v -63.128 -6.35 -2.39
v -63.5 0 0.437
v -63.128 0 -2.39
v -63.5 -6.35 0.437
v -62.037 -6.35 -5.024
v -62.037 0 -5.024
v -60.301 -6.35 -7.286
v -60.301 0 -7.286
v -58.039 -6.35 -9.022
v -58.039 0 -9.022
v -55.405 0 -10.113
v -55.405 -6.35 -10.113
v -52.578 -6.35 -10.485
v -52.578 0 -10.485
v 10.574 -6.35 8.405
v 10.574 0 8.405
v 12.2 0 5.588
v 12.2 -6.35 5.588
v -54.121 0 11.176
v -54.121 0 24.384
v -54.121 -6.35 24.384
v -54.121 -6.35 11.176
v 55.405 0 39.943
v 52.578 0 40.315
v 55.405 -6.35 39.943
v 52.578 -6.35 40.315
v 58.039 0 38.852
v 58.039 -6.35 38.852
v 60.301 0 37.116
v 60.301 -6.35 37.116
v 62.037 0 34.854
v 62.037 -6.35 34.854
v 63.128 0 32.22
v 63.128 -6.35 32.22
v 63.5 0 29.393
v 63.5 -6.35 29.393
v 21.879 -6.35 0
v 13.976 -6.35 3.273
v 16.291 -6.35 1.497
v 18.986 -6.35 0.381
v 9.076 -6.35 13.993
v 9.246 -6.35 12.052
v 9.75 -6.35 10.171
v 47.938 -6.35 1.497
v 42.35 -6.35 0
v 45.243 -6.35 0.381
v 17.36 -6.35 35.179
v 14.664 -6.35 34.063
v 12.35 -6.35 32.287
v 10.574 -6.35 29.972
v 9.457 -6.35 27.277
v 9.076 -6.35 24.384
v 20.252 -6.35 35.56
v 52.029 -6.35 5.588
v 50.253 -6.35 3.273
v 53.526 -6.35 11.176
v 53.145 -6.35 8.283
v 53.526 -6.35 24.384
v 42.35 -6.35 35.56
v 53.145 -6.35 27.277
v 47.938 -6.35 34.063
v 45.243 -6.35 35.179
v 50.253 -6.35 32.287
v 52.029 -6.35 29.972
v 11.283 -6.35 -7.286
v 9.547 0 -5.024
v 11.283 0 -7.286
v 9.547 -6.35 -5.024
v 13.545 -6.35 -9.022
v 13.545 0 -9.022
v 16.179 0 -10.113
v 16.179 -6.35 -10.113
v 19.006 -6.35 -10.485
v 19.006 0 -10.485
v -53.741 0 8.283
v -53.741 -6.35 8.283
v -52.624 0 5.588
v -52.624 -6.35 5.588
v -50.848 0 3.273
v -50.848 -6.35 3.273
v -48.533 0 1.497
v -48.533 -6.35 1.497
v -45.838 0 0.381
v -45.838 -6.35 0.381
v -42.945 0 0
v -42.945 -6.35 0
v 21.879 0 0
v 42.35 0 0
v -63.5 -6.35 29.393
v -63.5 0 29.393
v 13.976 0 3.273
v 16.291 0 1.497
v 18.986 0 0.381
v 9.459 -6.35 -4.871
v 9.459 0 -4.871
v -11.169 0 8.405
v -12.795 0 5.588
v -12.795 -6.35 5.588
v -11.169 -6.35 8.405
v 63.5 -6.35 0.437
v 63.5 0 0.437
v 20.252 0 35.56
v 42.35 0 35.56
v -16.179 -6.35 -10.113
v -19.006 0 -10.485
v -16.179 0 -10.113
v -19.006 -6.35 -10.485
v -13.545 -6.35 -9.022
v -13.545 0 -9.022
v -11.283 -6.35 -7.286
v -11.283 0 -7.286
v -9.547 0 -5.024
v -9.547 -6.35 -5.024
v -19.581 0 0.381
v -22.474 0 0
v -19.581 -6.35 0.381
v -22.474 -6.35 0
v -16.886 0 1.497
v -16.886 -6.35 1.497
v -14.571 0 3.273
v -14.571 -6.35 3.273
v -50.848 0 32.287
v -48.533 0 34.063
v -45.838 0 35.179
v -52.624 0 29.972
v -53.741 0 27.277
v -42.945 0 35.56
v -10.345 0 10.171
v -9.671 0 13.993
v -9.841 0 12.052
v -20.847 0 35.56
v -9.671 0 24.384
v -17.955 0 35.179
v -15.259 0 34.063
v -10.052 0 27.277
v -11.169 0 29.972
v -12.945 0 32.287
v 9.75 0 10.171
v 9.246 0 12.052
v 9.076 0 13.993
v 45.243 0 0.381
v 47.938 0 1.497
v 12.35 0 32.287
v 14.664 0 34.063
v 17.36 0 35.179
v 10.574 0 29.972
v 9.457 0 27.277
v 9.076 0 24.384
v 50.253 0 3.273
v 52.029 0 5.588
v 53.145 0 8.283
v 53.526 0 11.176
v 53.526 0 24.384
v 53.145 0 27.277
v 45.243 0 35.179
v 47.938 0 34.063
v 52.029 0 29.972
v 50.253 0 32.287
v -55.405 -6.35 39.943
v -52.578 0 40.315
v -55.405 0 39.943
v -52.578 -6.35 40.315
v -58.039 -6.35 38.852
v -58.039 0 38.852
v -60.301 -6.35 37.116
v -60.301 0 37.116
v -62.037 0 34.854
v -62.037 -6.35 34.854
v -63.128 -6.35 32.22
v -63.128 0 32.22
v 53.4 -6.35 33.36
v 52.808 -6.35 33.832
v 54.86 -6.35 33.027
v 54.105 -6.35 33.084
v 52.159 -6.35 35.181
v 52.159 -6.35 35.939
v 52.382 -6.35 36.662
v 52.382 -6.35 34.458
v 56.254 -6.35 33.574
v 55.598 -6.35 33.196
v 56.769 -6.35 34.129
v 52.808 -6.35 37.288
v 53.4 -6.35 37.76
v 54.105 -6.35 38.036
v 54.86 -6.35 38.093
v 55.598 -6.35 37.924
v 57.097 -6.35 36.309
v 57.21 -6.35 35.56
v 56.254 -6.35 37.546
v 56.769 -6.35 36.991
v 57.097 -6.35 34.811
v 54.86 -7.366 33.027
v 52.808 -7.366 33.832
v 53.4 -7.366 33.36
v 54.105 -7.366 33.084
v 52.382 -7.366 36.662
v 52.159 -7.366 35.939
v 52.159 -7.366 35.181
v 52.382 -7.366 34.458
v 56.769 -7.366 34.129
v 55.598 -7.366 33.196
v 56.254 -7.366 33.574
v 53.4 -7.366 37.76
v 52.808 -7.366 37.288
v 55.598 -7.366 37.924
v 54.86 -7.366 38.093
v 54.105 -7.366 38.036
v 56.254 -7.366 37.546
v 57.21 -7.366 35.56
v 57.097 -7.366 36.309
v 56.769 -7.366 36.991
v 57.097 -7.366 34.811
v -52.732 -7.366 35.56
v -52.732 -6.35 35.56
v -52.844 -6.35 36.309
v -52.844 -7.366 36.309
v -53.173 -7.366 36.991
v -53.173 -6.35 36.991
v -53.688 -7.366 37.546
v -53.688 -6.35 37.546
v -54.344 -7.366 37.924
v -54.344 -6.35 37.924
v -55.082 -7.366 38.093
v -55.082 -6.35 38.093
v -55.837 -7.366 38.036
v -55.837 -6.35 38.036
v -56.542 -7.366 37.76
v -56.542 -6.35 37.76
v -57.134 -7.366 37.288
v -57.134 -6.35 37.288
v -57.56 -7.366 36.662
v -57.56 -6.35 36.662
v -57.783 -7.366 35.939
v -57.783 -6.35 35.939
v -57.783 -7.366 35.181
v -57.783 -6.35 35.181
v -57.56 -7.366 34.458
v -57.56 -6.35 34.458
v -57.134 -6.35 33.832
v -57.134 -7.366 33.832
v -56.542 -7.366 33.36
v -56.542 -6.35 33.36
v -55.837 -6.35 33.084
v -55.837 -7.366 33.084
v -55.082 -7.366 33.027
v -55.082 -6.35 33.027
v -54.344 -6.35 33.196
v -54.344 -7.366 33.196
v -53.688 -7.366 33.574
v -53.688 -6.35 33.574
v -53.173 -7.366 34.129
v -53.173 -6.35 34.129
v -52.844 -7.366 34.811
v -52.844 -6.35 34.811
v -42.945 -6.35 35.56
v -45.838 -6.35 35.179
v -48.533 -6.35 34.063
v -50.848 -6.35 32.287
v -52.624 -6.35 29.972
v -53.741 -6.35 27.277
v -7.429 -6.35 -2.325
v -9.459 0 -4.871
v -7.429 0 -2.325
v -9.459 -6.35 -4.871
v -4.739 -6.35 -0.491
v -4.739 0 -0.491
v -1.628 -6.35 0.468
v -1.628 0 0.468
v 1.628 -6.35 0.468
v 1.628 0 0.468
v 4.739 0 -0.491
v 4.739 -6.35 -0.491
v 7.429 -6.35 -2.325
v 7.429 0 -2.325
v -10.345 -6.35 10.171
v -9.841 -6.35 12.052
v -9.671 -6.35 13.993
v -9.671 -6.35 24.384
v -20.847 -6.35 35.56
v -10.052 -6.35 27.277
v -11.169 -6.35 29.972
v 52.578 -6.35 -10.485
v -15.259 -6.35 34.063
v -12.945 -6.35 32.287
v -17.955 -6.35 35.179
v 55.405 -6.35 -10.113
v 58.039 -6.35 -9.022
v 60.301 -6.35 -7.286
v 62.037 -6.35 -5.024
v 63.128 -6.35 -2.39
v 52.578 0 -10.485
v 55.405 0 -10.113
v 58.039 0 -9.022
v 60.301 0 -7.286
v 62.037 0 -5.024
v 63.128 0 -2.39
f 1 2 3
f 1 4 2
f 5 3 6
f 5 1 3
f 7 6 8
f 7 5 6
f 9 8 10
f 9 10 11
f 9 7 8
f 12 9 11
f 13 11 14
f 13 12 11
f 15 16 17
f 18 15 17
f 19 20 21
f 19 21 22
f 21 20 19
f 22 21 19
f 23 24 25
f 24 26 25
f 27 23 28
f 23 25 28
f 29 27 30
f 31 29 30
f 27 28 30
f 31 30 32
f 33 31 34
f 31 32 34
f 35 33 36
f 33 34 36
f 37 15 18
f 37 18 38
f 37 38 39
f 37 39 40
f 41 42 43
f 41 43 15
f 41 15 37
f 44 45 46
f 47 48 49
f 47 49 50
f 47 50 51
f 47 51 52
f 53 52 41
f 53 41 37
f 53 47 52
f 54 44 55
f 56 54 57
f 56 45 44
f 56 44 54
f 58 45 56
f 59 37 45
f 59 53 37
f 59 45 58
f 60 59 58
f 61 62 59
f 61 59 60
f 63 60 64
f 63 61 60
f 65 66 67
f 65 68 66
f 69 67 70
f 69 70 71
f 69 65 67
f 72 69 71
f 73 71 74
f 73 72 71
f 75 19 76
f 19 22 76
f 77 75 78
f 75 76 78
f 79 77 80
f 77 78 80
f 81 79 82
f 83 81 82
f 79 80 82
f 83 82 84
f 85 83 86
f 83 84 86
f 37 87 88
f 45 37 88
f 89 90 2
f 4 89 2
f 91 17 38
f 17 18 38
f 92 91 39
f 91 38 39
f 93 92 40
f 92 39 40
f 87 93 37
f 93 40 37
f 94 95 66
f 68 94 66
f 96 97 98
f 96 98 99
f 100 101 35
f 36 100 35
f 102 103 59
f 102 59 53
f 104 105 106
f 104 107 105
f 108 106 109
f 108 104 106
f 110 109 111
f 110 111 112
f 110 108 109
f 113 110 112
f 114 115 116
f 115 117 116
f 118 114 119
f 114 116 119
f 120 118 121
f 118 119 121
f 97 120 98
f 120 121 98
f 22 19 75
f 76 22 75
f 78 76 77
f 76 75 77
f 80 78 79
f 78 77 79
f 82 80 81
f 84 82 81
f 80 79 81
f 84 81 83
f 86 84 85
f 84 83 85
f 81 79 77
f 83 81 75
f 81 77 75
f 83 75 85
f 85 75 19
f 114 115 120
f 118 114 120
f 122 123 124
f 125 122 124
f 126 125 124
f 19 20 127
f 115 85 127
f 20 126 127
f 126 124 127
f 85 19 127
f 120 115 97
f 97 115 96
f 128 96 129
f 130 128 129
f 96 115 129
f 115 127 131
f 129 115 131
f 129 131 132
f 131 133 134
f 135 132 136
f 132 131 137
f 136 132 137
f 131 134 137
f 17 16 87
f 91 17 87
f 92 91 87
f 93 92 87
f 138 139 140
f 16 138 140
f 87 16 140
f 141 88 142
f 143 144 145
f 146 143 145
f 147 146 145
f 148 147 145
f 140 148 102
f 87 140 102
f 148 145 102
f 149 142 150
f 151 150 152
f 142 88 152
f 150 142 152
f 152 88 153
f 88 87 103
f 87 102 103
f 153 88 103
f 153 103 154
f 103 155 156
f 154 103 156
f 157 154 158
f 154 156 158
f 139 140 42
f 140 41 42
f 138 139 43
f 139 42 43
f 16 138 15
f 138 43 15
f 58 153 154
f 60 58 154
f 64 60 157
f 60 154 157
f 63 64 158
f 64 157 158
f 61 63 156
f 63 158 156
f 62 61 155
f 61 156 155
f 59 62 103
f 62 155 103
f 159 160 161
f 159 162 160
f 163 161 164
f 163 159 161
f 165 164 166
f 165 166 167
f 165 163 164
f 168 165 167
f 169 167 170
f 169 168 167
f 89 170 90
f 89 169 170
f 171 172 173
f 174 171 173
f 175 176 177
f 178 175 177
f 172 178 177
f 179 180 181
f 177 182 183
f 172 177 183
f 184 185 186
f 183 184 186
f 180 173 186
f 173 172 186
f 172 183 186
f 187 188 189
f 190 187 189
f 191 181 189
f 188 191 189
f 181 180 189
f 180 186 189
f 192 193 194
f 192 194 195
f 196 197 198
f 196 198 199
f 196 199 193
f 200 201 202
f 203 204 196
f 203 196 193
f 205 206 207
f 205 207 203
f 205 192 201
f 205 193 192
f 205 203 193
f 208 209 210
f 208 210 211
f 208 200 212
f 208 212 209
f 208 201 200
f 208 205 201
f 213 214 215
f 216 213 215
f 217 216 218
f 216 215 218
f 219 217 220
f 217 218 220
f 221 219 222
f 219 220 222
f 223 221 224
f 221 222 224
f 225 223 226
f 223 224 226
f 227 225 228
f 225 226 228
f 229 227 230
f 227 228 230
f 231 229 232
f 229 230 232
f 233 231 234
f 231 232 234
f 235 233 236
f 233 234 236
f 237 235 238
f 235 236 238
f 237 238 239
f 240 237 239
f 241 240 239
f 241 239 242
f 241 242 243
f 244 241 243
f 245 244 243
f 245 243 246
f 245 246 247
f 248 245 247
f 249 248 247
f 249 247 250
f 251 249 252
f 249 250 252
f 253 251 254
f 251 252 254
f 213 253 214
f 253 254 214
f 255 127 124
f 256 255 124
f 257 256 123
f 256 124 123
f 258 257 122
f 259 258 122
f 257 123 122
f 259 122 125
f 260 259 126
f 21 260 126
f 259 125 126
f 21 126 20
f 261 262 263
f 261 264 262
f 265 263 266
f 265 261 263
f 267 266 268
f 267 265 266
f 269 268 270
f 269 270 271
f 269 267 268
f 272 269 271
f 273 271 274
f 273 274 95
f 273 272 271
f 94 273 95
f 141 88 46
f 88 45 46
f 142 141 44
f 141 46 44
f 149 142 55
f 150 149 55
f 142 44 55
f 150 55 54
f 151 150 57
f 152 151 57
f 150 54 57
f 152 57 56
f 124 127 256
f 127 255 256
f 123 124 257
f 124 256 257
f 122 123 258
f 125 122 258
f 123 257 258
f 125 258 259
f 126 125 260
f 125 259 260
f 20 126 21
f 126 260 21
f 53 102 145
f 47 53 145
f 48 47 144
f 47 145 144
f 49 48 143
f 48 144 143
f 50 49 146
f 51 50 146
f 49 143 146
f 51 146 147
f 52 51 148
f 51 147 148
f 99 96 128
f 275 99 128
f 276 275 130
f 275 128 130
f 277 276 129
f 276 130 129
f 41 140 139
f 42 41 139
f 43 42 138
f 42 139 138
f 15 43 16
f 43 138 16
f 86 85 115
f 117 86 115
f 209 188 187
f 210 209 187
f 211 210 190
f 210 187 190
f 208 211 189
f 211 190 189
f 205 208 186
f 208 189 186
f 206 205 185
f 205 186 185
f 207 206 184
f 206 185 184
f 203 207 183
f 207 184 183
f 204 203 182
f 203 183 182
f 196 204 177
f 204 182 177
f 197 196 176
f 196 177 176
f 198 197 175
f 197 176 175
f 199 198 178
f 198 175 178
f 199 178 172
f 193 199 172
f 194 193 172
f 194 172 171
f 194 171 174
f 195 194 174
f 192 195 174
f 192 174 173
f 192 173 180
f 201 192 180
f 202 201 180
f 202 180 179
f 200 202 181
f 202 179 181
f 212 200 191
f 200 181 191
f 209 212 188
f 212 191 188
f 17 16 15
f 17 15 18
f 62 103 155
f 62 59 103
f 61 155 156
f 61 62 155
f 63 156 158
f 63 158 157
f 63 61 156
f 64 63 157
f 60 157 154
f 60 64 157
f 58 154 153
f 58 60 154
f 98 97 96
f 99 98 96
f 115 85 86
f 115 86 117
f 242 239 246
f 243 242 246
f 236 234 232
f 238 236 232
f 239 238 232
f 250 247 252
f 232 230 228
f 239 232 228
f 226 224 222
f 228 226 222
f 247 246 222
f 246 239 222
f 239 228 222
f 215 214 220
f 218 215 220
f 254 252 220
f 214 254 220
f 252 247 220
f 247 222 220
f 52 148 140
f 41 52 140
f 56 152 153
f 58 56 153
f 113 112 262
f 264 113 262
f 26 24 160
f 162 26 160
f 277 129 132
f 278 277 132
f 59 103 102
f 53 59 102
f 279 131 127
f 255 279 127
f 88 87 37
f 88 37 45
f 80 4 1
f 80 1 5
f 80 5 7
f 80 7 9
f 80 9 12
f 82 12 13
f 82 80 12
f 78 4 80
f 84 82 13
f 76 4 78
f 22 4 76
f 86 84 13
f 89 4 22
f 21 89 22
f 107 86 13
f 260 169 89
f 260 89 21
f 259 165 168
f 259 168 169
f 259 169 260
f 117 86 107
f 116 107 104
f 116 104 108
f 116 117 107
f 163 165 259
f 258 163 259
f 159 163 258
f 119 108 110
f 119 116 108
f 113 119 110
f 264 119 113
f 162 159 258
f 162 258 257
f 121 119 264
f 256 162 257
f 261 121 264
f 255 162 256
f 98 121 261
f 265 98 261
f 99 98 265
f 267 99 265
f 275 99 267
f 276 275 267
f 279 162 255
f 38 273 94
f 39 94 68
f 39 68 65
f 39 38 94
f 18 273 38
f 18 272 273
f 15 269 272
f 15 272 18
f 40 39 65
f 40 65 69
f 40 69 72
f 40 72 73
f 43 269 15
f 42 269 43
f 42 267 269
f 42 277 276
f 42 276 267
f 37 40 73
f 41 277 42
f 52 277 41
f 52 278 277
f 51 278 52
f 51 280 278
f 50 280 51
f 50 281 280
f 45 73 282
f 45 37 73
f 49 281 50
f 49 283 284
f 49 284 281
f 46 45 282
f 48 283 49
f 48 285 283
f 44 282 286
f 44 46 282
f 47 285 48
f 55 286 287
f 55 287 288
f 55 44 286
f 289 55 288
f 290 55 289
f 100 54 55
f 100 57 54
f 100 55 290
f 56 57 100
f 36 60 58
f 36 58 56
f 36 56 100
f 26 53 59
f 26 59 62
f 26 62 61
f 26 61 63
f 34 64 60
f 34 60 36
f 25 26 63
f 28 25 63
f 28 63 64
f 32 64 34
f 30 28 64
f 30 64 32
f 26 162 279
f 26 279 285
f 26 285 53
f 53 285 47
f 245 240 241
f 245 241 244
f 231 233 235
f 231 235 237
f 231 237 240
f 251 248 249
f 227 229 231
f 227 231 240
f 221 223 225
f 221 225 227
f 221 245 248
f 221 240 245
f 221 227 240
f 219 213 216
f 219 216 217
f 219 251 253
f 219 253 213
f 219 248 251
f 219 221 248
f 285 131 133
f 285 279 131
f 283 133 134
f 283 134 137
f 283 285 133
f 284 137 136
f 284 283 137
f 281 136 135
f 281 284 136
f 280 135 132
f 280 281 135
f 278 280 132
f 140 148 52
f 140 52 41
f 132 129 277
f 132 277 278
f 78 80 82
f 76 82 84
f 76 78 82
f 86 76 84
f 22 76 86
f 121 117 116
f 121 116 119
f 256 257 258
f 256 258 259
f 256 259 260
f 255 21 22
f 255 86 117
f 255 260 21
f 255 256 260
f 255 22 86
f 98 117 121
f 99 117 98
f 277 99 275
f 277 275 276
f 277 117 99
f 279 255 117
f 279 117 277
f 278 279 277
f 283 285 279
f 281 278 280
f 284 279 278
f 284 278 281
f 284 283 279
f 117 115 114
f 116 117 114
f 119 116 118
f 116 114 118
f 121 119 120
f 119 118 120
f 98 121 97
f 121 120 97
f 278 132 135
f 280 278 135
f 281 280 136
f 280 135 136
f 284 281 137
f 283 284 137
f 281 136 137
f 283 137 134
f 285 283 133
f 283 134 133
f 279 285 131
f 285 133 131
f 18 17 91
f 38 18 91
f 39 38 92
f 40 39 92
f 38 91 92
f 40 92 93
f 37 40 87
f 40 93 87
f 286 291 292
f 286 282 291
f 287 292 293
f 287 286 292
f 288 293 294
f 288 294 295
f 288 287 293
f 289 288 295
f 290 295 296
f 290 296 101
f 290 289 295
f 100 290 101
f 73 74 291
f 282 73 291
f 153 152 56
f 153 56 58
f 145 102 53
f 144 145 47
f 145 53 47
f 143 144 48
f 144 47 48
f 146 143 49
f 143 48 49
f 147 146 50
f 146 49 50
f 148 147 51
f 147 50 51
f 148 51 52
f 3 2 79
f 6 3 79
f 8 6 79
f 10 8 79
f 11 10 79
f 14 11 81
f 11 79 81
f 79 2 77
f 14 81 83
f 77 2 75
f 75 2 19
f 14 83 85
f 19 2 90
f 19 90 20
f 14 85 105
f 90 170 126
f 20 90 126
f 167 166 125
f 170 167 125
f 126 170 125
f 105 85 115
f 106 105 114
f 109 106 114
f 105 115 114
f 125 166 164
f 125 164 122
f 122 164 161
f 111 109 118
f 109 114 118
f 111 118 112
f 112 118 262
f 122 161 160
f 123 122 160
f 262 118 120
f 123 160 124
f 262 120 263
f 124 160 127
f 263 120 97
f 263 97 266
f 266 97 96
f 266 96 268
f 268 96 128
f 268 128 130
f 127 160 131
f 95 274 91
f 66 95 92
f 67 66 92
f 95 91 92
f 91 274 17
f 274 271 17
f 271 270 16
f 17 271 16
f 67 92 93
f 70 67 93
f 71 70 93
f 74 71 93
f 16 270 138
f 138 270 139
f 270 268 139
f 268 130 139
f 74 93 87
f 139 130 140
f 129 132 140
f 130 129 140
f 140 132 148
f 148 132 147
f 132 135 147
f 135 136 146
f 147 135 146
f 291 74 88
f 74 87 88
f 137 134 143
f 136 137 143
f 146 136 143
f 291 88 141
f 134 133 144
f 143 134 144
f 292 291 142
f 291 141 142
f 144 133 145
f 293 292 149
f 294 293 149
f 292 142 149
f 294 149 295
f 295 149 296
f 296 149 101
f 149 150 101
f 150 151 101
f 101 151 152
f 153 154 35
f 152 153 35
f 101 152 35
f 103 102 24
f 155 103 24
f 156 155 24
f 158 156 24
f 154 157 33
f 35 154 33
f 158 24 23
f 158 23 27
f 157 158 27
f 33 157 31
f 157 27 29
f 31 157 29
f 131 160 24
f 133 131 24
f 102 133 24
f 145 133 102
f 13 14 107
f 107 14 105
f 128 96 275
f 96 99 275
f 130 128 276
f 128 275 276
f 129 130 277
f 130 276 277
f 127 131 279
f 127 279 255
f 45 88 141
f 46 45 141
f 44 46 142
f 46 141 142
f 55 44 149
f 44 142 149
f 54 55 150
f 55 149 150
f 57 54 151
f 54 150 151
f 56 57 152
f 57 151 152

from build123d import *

# Parameters (mm, degrees)
F1_DEPTH = 6.35
F2_R     = 10.922
F4_DEPTH = 25.4
F5_R     = 11.176
F7_DEPTH = 6.35
F8_R     = 2.54
F9_DEPTH = 1.016


with BuildPart() as f1:
    # F0 (on Front) → F1 (new body)
    with BuildSketch(Plane.XZ):
        Polygon((63.5, 40.315186), (-63.5, 40.315186), (-63.5, -10.484814), (-12.7, -10.484814), (0, 11.512231), (12.7, -10.484814), (63.5, -10.484814), align=None)
    extrude(amount=F1_DEPTH)

    # F2
    f2_edges = [f1.edges().sort_by_distance(p)[0] for p in [
        (63.5, -3.175, 40.315186),
        (-63.5, -3.175, 40.315186),
        (-63.5, -3.175, -10.484814),
        (-12.7, -3.175, -10.484814),
        (0, -3.175, 11.512231),
        (12.7, -3.175, -10.484814),
        (63.5, -3.175, -10.484814),
    ]]
    fillet(f2_edges, radius=F2_R)

    # F3 (on Front) → F4 (cut)
    with BuildSketch(Plane.XZ):
        Polygon((-9.671349, 35.56), (-54.121349, 35.56), (-54.121349, 0), (-16.021349, 0), (-9.671349, 10.998523), align=None)
        Polygon((53.526262, 35.56), (9.076262, 35.56), (9.076262, 10.998523), (15.426262, 0), (53.526262, 0), align=None)
    extrude(amount=F4_DEPTH, mode=Mode.SUBTRACT)

    # F5
    f5_edges = [f1.edges().sort_by_distance(p)[0] for p in [
        (-54.121349, -3.175, 35.56),
        (-9.671349, -3.175, 35.56),
        (-9.671349, -3.175, 10.998523),
        (-16.021349, -3.175, 0),
        (-54.121349, -3.175, 0),
        (15.426262, -3.175, 0),
        (9.076262, -3.175, 10.998523),
        (9.076262, -3.175, 35.56),
        (53.526262, -3.175, 35.56),
        (53.526262, -3.175, 0),
    ]]
    fillet(f5_edges, radius=F5_R)


with BuildPart() as f7:
    # F6 (on Front) → F7 (new body)
    with BuildSketch(Plane.XZ):
        with BuildLine():
            Line((-54.121349, 24.384), (-54.121349, 11.176))
            ThreePointArc((-54.121349, 11.176), (-50.847974, 3.273375), (-42.945349, 0))
            Line((-42.945349, 0), (-22.473815, 0))
            ThreePointArc((-22.473815, 0), (-16.885815, 1.4973), (-12.795115, 5.588))
            Line((-12.795115, 5.588), (-11.168649, 8.405123))
            ThreePointArc((-11.168649, 8.405123), (-10.052162, 11.100561), (-9.671349, 13.993123))
            Line((-9.671349, 13.993123), (-9.671349, 24.384))
            ThreePointArc((-9.671349, 24.384), (-12.944723, 32.286625), (-20.847349, 35.56))
            Line((-20.847349, 35.56), (-42.945349, 35.56))
            ThreePointArc((-42.945349, 35.56), (-50.847974, 32.286625), (-54.121349, 24.384))
        make_face()
        with BuildLine():
            Line((9.076262, 24.384), (9.076262, 13.993123))
            ThreePointArc((9.076262, 13.993123), (9.457075, 11.100561), (10.573562, 8.405123))
            Line((10.573562, 8.405123), (12.200029, 5.588))
            ThreePointArc((12.200029, 5.588), (16.290728, 1.4973), (21.878728, 0))
            Line((21.878728, 0), (42.350262, 0))
            ThreePointArc((42.350262, 0), (50.252887, 3.273375), (53.526262, 11.176))
            Line((53.526262, 11.176), (53.526262, 24.384))
            ThreePointArc((53.526262, 24.384), (50.252887, 32.286625), (42.350262, 35.56))
            Line((42.350262, 35.56), (20.252262, 35.56))
            ThreePointArc((20.252262, 35.56), (12.349637, 32.286625), (9.076262, 24.384))
        make_face()
    extrude(amount=F7_DEPTH)


with BuildPart() as f9:
    # F8 (on face) → F9 (new body)
    with BuildSketch(Plane.XZ.offset(6.35)):
        with Locations((54.670222, 35.56)):
            Circle(F8_R)
        with Locations((-55.271573, 35.56)):
            Circle(F8_R)
    extrude(amount=F9_DEPTH)


solid = Compound([f1.part, f7.part, f9.part])
